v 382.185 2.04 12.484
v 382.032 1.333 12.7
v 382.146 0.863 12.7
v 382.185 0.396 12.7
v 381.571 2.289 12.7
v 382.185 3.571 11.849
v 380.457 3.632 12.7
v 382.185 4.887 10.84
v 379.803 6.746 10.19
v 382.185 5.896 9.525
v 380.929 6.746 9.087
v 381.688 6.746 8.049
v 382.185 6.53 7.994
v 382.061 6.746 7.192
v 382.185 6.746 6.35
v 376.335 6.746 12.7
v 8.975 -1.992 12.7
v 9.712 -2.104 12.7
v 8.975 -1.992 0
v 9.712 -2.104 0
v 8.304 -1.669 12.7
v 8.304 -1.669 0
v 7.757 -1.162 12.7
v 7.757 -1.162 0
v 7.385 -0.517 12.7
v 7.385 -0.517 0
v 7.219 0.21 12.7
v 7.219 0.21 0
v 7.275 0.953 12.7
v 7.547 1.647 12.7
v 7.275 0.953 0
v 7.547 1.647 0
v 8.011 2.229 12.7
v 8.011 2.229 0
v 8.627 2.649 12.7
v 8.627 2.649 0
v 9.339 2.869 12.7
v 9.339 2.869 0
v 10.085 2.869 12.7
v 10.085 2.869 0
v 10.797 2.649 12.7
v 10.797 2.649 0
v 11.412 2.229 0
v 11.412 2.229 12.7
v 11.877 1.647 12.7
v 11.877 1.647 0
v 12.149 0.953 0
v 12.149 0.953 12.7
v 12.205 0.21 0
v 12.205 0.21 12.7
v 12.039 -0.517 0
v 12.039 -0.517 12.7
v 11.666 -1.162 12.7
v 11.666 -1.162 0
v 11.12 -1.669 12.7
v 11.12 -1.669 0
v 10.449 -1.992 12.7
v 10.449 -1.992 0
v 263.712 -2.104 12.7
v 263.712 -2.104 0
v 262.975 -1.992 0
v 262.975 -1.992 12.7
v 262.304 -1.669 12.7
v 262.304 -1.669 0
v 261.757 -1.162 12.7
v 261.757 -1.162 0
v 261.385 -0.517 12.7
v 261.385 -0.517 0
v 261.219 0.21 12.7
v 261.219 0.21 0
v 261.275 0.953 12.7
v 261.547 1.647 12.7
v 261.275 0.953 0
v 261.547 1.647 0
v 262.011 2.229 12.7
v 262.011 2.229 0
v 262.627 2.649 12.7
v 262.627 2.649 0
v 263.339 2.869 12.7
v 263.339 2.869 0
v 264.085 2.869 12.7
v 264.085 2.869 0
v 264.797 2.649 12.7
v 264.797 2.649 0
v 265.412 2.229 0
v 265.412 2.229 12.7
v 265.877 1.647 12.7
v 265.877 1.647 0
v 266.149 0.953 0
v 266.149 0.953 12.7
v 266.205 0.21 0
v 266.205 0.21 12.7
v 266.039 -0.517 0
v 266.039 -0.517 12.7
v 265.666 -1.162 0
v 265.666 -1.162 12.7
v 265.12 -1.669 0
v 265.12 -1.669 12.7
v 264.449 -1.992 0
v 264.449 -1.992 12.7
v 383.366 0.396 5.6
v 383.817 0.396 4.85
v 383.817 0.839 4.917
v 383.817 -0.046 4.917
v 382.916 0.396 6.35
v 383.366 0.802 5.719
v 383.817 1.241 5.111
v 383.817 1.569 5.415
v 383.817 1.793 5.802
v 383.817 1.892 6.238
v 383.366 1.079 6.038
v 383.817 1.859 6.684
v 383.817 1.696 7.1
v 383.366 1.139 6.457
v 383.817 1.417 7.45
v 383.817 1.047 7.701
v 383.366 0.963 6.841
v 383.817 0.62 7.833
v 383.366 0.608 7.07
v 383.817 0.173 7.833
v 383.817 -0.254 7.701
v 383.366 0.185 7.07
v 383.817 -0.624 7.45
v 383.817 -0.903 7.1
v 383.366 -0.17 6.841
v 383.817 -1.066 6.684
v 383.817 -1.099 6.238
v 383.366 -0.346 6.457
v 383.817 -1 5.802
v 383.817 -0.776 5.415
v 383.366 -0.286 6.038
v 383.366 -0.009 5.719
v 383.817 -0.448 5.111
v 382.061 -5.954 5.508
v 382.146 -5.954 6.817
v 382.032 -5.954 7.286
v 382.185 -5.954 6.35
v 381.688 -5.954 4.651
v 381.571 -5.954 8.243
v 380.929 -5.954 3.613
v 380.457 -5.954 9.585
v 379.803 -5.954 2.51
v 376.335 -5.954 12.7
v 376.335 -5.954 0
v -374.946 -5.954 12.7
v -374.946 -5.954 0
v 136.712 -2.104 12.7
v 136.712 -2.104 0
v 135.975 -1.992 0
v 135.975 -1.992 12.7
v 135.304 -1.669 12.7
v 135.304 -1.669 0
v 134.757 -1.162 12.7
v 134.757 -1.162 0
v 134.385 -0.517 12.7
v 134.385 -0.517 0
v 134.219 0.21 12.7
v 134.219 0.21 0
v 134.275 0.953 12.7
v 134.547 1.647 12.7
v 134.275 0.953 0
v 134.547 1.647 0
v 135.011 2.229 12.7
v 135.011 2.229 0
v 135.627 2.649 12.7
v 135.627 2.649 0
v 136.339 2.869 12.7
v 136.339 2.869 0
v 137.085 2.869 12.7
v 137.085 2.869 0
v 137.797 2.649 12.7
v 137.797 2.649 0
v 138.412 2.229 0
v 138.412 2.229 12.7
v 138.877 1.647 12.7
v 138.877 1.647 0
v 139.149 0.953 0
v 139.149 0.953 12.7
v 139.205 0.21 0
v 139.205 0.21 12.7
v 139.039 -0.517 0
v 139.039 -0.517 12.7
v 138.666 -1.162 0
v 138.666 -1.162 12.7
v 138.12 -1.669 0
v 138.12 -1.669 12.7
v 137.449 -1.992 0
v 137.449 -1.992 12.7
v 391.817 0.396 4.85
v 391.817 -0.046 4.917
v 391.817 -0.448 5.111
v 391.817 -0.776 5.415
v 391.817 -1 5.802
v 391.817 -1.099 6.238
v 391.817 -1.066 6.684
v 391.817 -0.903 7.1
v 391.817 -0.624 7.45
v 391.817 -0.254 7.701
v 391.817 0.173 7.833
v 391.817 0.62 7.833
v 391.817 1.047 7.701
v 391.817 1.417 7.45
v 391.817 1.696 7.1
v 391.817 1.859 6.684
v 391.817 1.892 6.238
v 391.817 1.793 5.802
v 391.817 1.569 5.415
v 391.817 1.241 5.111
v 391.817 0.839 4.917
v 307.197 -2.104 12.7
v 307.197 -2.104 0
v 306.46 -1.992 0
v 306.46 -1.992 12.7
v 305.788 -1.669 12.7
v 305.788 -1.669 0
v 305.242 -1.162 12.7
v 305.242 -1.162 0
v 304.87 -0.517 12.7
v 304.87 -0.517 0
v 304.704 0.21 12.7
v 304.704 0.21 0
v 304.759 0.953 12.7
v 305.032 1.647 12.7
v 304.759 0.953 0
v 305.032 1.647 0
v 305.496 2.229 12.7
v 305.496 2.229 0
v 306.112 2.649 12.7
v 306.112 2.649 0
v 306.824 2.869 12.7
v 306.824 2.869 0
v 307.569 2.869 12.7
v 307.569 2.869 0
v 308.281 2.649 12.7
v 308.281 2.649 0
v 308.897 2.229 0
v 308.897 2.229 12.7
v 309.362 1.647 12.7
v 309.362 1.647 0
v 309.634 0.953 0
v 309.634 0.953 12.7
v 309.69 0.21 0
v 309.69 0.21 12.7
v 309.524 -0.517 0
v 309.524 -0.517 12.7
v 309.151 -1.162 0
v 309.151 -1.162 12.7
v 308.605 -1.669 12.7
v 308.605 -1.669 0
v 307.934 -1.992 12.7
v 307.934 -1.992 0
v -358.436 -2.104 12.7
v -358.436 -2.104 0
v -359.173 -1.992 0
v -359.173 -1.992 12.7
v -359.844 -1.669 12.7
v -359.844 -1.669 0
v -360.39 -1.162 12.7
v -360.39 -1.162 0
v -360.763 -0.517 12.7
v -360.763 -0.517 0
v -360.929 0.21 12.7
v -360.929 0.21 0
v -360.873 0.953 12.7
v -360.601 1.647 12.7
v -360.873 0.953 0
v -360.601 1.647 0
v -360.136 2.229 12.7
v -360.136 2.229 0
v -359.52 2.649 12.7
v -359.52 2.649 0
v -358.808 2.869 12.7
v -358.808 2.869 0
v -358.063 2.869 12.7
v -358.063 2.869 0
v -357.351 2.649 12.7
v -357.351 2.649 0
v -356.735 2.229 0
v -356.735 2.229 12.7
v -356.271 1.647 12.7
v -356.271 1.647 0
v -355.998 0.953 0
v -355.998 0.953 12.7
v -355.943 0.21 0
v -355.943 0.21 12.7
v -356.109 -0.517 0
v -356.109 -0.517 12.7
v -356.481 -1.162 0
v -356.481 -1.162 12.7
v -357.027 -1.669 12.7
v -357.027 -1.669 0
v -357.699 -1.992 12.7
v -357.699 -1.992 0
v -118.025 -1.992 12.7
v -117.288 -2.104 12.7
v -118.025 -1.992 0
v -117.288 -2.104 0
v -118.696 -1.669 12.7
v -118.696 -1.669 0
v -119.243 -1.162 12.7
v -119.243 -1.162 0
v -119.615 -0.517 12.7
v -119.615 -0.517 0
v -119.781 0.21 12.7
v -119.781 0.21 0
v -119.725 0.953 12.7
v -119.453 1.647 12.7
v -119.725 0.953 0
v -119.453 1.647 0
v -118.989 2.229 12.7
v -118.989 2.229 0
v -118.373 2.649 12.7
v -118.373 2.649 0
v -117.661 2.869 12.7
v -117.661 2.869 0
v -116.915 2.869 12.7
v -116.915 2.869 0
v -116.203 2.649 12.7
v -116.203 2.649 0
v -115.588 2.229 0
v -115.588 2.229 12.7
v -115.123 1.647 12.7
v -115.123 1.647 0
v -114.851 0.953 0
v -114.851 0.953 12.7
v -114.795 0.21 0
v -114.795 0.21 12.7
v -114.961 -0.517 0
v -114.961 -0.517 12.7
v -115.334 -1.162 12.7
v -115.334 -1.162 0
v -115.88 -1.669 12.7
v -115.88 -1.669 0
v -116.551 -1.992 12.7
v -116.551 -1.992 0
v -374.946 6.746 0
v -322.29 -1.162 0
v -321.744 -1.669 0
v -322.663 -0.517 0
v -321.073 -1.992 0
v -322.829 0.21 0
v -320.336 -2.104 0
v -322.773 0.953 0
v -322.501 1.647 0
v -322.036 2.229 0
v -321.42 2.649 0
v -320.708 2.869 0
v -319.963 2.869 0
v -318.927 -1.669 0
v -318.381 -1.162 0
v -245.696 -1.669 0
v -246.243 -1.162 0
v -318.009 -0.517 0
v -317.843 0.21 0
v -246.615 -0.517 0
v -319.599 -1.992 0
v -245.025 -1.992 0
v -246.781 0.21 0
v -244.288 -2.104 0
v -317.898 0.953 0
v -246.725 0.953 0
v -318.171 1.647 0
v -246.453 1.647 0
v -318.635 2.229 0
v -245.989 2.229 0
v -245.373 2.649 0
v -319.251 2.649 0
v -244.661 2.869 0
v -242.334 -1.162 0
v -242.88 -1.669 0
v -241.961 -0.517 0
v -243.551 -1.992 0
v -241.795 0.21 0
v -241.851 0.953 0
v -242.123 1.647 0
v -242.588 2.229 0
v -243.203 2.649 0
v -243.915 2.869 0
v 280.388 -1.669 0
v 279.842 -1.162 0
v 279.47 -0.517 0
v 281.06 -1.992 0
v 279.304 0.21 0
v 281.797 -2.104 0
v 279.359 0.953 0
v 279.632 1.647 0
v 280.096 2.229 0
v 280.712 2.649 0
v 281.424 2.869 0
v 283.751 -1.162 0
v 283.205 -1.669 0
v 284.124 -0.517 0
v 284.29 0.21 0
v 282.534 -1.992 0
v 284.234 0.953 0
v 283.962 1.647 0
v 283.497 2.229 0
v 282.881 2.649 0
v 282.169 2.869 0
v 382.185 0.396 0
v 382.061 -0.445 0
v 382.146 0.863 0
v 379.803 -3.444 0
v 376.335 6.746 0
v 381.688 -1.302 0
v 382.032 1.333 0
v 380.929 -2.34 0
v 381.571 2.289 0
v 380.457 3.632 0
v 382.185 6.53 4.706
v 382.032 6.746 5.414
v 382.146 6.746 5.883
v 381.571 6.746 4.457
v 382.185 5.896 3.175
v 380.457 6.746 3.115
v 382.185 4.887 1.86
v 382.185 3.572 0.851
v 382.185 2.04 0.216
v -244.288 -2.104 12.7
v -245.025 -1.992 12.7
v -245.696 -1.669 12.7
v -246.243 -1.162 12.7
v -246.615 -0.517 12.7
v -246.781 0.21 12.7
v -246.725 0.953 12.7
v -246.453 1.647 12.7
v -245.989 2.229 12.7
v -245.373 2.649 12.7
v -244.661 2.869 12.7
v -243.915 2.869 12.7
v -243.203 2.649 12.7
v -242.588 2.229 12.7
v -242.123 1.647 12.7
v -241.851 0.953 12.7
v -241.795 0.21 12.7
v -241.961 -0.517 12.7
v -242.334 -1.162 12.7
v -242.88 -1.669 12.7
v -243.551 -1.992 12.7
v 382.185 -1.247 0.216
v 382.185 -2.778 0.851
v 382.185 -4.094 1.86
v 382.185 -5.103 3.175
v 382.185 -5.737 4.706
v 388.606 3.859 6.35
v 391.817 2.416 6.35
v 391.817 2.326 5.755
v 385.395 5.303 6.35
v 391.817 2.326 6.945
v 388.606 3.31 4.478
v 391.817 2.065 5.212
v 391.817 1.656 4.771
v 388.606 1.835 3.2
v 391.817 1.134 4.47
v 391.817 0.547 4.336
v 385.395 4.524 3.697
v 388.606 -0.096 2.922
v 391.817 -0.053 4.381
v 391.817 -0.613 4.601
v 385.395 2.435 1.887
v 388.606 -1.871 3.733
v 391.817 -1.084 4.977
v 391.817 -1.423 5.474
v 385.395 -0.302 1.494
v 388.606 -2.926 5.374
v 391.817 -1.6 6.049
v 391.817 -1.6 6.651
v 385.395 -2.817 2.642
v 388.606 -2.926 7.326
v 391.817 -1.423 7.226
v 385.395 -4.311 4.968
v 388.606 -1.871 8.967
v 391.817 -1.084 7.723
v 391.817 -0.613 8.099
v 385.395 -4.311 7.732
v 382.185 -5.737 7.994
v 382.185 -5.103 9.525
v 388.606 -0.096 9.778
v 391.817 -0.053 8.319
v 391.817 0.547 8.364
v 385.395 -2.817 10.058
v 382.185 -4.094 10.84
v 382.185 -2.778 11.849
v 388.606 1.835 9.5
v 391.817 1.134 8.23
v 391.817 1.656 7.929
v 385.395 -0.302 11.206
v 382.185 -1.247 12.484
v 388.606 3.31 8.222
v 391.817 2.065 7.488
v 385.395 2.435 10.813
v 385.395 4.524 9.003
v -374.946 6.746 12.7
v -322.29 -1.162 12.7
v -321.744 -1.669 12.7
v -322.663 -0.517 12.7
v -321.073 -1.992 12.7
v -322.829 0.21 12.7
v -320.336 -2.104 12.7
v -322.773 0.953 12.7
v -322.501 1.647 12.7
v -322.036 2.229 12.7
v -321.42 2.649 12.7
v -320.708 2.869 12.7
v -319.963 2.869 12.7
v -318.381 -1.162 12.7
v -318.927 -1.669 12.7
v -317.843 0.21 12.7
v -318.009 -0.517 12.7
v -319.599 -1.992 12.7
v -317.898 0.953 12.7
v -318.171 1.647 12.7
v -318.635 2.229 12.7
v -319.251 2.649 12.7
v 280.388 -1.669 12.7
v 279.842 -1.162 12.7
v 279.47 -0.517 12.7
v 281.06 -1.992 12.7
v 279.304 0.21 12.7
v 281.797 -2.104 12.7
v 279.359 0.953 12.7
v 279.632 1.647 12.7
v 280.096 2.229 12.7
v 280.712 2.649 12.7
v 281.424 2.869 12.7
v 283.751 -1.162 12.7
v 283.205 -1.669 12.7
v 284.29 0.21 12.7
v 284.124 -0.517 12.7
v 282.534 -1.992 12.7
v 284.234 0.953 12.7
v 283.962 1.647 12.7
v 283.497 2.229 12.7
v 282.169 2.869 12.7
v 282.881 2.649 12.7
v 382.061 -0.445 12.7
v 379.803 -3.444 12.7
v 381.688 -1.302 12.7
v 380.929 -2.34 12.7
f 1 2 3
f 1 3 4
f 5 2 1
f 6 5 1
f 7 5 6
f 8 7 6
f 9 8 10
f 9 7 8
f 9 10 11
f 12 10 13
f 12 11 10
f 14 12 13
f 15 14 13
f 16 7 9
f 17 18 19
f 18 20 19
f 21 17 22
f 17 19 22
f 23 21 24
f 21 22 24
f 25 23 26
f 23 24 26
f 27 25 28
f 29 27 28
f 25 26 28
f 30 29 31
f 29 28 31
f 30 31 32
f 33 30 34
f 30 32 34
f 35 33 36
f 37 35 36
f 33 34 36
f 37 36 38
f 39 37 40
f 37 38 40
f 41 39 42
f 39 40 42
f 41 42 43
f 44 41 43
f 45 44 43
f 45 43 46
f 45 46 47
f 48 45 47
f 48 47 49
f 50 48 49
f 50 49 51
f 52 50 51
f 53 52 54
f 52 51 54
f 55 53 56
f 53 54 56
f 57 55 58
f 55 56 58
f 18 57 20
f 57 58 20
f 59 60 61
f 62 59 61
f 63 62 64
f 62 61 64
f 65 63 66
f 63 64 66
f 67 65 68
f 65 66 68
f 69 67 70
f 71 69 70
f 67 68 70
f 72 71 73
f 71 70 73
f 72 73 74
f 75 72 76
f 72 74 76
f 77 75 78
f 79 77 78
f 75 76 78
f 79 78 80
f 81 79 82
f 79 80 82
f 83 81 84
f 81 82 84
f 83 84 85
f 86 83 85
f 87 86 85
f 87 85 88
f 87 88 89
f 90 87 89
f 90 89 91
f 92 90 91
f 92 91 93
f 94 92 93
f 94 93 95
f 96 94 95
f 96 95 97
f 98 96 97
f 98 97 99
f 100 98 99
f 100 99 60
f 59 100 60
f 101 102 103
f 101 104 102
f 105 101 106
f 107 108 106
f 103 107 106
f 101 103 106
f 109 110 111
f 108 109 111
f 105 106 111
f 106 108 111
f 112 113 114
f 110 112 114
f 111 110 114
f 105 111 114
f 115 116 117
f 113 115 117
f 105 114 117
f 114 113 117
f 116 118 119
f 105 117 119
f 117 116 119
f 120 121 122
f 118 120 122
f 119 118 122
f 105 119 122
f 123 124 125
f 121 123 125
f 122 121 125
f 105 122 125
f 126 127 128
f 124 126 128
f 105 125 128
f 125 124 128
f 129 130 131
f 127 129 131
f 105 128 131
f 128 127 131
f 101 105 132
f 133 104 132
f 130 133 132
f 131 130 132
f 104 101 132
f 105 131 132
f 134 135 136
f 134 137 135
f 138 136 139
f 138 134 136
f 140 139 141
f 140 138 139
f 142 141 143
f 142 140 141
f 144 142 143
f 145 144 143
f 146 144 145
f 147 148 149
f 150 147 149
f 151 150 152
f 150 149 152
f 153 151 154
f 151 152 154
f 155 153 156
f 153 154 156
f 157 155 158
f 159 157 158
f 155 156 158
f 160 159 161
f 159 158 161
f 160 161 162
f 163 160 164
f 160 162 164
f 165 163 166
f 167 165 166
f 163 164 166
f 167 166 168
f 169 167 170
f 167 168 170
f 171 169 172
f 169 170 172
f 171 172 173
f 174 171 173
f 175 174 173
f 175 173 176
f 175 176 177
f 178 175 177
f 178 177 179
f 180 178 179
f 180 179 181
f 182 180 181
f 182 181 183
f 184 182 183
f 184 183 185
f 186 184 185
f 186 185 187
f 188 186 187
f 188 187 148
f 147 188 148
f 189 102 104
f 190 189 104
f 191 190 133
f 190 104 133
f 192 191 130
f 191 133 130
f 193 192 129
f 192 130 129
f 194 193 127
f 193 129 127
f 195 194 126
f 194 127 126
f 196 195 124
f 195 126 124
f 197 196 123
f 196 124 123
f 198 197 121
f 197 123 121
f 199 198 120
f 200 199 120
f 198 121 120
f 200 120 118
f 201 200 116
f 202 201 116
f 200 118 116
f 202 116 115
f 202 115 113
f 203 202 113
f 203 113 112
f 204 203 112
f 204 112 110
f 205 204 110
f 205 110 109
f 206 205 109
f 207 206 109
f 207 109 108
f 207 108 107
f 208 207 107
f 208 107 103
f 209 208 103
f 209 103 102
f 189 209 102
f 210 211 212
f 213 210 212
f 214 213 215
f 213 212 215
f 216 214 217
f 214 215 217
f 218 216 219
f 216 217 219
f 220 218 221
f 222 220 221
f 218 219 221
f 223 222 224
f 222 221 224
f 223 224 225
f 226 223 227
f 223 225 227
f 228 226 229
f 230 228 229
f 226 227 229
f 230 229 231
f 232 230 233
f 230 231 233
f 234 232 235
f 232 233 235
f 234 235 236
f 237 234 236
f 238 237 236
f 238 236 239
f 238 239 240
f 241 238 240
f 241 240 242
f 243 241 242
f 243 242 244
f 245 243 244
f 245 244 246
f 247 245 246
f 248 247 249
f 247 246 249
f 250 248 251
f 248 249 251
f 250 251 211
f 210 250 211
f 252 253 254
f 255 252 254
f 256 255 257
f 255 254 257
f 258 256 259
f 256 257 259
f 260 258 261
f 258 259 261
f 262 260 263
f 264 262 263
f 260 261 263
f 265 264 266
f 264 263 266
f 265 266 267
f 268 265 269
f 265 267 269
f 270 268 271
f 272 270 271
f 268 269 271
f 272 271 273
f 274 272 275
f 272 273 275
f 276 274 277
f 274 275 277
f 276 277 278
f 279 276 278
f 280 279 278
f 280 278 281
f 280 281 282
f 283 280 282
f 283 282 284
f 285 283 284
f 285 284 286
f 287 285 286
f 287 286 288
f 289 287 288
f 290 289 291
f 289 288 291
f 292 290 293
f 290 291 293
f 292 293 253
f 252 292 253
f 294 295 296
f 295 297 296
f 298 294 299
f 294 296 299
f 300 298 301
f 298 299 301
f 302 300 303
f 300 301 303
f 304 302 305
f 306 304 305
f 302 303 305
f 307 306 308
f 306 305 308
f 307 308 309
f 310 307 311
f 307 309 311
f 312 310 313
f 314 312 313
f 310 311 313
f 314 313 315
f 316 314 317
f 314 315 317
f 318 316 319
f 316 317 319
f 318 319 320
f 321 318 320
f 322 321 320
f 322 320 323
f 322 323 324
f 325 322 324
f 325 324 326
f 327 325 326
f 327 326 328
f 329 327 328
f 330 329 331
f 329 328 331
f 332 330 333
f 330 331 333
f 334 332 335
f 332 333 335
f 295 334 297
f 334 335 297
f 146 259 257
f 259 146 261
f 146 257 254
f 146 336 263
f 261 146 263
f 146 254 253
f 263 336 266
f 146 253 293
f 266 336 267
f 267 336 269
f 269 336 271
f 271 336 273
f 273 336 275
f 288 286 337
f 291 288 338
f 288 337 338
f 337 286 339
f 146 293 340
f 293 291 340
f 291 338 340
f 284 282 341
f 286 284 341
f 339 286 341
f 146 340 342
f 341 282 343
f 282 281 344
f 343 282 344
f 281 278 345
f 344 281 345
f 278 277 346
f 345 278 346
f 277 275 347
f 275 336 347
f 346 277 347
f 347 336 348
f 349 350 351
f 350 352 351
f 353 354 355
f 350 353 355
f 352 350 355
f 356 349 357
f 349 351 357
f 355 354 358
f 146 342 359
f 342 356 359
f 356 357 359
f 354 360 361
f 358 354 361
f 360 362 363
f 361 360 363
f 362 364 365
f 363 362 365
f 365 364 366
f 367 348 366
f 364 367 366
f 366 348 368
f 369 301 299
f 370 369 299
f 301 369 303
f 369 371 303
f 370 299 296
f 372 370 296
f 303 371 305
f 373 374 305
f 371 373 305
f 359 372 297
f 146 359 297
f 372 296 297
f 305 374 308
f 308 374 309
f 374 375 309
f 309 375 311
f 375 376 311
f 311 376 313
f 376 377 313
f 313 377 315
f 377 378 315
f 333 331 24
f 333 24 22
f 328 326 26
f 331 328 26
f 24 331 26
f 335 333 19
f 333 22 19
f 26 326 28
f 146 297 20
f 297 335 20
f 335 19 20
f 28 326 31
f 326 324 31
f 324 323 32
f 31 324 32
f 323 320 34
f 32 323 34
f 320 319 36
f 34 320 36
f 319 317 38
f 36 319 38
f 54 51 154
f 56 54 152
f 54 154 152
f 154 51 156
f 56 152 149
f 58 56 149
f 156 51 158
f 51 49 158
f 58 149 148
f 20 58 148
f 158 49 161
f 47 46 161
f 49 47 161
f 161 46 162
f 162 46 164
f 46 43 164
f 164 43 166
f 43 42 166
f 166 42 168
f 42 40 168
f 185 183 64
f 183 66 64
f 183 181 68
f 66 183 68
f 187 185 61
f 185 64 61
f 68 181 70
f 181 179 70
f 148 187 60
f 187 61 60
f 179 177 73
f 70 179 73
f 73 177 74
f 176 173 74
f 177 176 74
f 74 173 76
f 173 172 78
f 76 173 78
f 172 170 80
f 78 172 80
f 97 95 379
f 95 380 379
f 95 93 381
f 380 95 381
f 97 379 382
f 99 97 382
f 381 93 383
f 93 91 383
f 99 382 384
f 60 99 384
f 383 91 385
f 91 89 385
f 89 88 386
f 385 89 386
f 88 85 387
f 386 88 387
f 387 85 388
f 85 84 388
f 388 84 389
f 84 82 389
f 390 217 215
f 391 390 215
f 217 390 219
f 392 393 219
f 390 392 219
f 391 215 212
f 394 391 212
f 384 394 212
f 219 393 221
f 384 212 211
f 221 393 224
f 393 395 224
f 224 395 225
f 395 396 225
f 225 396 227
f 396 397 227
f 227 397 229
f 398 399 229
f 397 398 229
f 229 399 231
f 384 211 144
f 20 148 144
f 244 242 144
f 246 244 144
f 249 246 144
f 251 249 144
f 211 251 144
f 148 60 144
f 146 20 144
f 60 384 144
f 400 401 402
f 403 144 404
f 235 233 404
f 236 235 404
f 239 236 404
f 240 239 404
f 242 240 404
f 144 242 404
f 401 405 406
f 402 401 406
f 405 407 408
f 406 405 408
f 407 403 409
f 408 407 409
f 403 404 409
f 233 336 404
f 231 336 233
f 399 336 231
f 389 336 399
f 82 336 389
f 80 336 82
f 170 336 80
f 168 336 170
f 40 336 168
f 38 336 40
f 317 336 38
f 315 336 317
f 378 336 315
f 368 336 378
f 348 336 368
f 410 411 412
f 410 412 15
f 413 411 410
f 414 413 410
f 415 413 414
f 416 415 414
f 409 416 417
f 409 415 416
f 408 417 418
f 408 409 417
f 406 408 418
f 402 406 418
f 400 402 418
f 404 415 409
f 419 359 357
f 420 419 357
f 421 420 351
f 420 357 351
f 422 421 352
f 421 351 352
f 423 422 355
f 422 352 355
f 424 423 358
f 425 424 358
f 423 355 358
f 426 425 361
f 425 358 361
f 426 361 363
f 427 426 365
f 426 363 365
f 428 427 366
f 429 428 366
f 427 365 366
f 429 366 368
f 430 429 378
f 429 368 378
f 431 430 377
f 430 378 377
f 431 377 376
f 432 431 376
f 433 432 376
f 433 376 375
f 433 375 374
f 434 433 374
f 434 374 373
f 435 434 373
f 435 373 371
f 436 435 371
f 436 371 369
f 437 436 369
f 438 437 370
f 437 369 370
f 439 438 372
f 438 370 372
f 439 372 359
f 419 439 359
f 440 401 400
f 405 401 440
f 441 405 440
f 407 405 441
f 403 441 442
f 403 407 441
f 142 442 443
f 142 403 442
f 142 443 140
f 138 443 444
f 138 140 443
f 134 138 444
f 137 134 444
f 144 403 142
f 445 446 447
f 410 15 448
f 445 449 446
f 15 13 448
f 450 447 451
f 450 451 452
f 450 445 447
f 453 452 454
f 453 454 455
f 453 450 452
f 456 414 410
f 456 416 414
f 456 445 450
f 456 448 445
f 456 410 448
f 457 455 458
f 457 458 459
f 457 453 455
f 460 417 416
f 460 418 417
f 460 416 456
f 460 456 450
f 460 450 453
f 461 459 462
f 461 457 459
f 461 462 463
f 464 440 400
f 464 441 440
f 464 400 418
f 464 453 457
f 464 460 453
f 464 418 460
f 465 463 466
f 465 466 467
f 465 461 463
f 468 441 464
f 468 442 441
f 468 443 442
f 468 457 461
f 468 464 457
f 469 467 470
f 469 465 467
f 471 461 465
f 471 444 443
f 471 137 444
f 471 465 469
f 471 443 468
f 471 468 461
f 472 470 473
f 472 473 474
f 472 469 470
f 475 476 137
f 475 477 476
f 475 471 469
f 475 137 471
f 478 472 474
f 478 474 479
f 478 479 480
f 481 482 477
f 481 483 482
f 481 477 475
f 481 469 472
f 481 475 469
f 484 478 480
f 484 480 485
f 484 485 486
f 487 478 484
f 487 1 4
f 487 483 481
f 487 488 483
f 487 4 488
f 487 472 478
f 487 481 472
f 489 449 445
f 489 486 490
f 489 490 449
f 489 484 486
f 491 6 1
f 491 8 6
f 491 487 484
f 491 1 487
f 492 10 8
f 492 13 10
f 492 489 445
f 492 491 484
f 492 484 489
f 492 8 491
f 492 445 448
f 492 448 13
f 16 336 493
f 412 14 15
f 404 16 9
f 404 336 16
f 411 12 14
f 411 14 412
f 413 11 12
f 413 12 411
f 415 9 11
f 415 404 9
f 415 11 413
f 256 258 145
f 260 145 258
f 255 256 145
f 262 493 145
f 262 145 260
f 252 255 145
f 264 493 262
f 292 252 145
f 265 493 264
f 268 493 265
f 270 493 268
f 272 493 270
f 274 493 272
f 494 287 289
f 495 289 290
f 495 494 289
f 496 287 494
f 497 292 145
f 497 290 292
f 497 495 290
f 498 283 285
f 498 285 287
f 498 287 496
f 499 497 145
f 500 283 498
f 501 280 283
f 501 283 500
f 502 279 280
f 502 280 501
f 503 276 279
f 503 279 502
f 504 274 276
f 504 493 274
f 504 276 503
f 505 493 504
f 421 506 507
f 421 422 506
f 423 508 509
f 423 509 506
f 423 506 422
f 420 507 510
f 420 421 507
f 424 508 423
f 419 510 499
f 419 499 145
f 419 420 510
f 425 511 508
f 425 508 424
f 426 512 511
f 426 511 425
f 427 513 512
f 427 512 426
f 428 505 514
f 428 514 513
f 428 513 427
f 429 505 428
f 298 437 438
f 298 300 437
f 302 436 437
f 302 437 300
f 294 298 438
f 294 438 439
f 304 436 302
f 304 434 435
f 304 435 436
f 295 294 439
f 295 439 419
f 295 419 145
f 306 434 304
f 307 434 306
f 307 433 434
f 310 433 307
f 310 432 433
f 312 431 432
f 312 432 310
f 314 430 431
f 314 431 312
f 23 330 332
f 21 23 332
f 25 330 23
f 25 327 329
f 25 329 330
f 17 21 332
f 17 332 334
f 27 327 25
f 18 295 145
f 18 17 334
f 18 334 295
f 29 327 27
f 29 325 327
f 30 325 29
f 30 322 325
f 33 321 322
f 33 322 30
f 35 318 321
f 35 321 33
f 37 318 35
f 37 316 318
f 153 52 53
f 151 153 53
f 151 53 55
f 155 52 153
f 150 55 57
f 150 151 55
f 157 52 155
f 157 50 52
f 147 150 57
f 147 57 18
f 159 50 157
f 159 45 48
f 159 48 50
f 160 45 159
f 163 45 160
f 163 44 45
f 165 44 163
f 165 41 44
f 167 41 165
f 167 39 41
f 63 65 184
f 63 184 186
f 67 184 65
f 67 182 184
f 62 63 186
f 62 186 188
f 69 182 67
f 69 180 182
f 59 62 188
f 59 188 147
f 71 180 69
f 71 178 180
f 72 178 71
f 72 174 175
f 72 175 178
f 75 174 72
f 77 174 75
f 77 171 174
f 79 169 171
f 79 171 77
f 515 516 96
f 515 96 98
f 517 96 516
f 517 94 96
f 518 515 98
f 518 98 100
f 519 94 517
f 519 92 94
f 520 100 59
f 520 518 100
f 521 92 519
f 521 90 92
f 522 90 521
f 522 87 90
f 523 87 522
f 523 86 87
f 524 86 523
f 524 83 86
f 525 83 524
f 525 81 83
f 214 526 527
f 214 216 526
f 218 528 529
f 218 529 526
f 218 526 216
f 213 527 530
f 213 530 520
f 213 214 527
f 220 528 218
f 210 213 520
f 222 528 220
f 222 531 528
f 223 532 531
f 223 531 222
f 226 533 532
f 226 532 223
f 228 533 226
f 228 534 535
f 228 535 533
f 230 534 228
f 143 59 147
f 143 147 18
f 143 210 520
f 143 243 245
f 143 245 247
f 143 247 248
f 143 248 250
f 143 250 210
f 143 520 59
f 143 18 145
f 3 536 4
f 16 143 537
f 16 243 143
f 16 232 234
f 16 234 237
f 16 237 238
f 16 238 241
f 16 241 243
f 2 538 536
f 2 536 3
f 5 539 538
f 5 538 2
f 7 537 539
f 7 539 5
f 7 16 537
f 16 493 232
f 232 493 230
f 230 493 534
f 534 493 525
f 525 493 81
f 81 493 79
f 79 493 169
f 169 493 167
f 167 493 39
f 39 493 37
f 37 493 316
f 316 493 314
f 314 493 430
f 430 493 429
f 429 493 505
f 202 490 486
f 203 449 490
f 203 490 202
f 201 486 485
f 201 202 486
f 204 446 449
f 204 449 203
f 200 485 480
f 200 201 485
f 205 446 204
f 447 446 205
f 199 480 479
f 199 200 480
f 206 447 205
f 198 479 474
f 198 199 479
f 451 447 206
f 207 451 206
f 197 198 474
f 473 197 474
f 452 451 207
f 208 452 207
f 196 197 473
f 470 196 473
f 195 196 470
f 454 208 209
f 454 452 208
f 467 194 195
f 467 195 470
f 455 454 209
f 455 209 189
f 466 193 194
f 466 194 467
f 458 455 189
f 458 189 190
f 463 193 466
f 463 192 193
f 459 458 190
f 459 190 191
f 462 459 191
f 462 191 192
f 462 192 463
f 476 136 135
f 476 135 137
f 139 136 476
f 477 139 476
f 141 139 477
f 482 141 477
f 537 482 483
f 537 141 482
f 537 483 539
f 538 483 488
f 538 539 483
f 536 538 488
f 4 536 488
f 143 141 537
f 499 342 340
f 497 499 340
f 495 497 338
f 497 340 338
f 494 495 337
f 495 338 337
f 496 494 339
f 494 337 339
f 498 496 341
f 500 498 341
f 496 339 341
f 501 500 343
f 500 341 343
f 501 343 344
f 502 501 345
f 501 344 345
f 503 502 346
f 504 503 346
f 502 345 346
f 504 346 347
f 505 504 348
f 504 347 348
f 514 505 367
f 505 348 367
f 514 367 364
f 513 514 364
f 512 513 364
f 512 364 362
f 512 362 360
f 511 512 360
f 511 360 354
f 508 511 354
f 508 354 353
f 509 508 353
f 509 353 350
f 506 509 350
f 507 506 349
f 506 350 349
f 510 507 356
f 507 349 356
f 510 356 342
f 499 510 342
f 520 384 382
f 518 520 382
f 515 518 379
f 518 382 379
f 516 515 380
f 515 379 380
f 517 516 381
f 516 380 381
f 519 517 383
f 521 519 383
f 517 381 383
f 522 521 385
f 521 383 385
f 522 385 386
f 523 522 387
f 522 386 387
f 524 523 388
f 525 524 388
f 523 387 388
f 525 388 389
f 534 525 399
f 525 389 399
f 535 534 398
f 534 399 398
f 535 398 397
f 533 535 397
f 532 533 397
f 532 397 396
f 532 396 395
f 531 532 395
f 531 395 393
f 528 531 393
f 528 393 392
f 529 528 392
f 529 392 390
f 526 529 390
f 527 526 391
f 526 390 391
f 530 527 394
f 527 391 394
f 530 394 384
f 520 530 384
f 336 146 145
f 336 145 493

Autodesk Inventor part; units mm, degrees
ref_plane "YZ Plane" through (0, 0, 0) normal (1, 0, 0) x (0, 1, 0)
ref_plane "XZ Plane" through (0, 0, 0) normal (0, 1, 0) x (-1, 0, 0)
sketch "Sketch1" plane through (0, 0, 0) normal (0, 0, 1) x (1, 0, 0)
  line L0 (-374.9457, 6.7465) -> (391.8168, 6.7465)
  line L1 (391.8168, 6.7465) -> (391.8168, -5.9535)
  line L2 (391.8168, -5.9535) -> (-374.9457, -5.9535)
  line L3 (-374.9457, -5.9535) -> (-374.9457, 6.7465)
  dimension "d0" = 766.7625
  dimension "d1" = 12.7
extrude "Extrusion1" add sketch "Sketch1" along normal blind 12.7
hole "Hole3" at (-358.4357, 0.3965, 12.7) direction (0, 0, -1) diameter 5 end through all
hole "Hole4" at (-320.3357, 0.3965, 12.7) direction (0, 0, -1) diameter 5 end through all
hole "Hole5" at (-244.2881, 0.3965, 12.7) direction (0, 0, -1) diameter 5 end through all
hole "Hole6" at (-117.2881, 0.3965, 12.7) direction (0, 0, -1) diameter 5 end through all
hole "Hole7" at (9.7119, 0.3965, 12.7) direction (0, 0, -1) diameter 5 end through all
hole "Hole8" at (136.7119, 0.3965, 12.7) direction (0, 0, -1) diameter 5 end through all
hole "Hole9" at (263.7119, 0.3965, 12.7) direction (0, 0, -1) diameter 5 end through all
hole "Hole10" at (281.7967, 0.3965, 12.7) direction (0, 0, -1) diameter 5 end through all
hole "Hole11" at (307.1967, 0.3965, 12.7) direction (0, 0, -1) diameter 5 end through all
hole "Hole12" at (391.8168, 0.3965, 6.35) direction (-1, 0, 0) diameter 3 depth 8 tip angle 118
ref_plane "Work Plane1" through (387.8168, 0.3965, 6.35) normal (0, 0, 1) x (1, 0, 0)
sketch "Sketch4" plane through (387.8168, 0.3965, 6.35) normal (0, 0, 1) x (1, 0, 0)
  line L0 (4, 6.35) -> (4, -6.35) projected
  line L1 (4, 0) -> (-4.9613, 0)
  line L2 (-839.4388, 0) -> (234.0288, 0) projected
  line L3 (4, 2.0193) -> (4, 6.35)
  line L4 (-5.6322, 6.35) -> (4, 2.0193)
  line L5 (-5.6322, 9.0208) -> (4, 9.0208)
  line L6 (4, 9.0208) -> (4, 6.0715)
  line L7 (-5.6322, 6.35) -> (-11.5724, 9.0208)
  line L8 (-5.9043, 9.0208) -> (-11.5724, 9.0208)
  line L9 (-5.6322, 9.0208) -> (-5.9043, 9.0208)
revolve "Revolution2" cut sketch "Sketch4" angle 360 about axis through (391.8168, 0.3965, 6.35) along (-1, 0, 0)
properties part number "Long rod"
